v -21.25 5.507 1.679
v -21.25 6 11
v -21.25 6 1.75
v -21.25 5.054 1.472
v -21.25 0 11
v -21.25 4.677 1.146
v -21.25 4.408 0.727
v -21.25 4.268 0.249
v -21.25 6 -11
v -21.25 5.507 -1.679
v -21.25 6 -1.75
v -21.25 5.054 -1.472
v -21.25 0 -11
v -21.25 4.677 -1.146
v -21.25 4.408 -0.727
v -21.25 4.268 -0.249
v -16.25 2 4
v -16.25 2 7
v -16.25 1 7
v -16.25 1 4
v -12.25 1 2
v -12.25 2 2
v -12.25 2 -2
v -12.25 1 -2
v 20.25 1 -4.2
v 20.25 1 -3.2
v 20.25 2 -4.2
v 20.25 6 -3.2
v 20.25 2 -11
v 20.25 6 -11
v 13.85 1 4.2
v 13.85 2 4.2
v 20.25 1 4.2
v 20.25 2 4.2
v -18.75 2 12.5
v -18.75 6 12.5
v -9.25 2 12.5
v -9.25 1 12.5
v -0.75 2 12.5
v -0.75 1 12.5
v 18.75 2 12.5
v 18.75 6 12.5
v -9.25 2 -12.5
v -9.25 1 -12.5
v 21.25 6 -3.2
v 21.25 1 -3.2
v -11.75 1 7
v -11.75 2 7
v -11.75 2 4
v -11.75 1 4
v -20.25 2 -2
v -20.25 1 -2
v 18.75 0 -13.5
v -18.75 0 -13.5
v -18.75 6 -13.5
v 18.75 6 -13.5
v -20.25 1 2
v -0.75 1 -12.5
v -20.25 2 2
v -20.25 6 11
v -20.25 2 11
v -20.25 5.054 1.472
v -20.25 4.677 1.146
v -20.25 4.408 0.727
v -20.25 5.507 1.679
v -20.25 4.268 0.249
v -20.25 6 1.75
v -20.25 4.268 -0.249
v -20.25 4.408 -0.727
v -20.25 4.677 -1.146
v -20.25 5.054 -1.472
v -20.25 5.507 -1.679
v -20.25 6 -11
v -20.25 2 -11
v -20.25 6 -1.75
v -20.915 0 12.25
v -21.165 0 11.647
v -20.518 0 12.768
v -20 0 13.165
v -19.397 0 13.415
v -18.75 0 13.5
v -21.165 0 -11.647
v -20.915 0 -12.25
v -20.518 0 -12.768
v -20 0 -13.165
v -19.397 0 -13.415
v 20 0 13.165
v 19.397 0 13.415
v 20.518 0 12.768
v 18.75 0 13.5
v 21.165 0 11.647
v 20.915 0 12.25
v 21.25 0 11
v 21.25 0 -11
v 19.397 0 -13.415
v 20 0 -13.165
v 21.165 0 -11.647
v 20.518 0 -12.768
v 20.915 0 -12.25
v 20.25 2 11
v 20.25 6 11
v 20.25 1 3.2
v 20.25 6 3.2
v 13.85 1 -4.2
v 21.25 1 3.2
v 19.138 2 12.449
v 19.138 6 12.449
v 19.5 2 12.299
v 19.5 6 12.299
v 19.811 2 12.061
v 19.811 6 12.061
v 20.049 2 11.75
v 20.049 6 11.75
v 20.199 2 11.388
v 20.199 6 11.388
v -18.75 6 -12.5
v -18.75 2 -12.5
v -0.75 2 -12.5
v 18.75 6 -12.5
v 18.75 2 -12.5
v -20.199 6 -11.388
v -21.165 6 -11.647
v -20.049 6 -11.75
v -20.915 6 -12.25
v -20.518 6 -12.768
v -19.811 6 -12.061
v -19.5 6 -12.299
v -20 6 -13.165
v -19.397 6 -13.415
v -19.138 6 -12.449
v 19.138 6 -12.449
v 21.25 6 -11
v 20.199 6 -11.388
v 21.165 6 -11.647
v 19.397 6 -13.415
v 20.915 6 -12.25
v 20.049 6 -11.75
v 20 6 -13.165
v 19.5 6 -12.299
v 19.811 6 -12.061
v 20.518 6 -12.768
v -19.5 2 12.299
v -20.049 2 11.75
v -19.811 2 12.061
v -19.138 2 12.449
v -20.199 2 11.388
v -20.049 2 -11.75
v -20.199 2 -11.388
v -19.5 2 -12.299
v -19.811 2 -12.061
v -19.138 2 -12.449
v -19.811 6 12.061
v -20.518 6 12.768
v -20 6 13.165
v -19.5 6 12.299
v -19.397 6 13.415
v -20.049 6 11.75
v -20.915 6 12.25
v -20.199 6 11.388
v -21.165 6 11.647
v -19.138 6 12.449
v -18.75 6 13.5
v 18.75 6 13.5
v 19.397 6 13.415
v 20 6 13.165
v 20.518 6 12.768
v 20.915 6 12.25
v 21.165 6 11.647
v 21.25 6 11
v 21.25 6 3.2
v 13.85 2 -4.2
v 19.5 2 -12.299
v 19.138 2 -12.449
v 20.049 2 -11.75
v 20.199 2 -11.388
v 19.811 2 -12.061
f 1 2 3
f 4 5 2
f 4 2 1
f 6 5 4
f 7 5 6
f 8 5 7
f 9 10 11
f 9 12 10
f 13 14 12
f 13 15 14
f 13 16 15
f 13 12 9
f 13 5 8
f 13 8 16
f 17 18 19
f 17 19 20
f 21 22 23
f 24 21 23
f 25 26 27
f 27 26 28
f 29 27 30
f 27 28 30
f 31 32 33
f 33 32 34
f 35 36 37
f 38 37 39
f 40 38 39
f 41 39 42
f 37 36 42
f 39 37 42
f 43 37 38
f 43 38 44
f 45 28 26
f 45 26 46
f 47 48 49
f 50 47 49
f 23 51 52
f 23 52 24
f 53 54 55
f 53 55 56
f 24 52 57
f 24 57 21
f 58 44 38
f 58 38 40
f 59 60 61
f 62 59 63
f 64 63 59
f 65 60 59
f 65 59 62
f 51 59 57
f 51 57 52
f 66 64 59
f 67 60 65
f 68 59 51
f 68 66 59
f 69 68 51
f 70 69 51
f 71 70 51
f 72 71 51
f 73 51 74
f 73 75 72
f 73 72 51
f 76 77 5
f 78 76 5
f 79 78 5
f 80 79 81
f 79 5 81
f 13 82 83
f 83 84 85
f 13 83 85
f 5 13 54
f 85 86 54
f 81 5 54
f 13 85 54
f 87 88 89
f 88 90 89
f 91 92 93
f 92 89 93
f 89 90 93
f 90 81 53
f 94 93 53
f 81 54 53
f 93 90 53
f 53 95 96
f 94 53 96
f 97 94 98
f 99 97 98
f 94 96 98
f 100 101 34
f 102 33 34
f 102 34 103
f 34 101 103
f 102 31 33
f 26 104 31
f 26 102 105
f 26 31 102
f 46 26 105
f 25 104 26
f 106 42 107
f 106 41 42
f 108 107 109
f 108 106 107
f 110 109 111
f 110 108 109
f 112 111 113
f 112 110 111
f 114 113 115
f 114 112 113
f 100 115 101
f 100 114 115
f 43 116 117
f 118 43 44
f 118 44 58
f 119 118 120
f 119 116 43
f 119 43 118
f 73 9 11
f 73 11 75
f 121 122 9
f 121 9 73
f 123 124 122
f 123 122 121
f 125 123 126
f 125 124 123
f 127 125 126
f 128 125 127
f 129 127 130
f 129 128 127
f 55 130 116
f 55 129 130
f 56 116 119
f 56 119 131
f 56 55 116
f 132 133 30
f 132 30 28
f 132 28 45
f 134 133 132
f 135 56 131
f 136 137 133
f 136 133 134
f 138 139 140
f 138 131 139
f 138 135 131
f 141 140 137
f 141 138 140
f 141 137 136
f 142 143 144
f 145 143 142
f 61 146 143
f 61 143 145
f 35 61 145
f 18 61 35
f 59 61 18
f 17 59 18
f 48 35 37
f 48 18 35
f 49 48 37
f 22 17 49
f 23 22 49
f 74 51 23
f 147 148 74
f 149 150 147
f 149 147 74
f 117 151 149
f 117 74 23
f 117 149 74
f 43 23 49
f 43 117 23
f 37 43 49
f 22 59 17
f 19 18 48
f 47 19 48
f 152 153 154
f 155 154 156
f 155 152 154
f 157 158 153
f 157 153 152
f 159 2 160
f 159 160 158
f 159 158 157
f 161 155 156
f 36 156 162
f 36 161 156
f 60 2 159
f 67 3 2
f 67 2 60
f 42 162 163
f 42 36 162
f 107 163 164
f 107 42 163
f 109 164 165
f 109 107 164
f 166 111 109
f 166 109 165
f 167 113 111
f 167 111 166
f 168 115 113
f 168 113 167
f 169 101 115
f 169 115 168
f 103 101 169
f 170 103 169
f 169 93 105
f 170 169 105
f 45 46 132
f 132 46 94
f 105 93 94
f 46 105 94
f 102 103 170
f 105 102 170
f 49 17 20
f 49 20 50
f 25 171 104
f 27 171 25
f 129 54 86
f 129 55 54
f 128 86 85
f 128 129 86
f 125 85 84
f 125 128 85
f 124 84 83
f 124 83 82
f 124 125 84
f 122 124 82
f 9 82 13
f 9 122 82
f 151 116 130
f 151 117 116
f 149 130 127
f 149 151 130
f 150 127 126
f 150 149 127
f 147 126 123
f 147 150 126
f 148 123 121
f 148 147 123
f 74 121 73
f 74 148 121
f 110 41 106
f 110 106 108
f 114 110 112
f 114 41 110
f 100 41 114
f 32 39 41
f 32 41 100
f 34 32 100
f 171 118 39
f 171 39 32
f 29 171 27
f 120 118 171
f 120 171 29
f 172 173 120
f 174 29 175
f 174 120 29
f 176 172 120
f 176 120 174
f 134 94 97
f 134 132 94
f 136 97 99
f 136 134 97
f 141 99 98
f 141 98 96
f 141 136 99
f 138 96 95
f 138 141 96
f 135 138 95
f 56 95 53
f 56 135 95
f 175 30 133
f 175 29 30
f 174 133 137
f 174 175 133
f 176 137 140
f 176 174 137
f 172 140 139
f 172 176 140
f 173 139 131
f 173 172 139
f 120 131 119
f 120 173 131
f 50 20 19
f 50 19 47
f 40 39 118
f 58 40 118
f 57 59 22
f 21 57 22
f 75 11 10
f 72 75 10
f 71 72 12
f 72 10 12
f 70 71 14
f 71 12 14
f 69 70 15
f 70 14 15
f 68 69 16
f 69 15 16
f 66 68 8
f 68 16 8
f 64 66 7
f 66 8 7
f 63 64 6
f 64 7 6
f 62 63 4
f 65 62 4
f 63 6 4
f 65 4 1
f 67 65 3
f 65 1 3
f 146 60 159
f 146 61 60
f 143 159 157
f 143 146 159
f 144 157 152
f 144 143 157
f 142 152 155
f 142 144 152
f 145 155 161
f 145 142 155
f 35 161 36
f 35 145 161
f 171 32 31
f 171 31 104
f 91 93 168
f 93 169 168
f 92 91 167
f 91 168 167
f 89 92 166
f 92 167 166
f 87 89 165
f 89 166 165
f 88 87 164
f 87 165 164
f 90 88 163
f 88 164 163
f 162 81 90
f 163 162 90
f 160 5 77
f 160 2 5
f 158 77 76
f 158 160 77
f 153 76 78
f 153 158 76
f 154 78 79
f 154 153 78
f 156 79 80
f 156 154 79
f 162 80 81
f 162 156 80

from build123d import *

# Parameters (mm, degrees)
SKETCH1_W           = 42.5
SKETCH1_H           = 27
BOSS_EXTRUDE1_DEPTH = 6
SKETCH2_W           = 40.5
SKETCH2_H           = 25
CUT_EXTRUDE1_DEPTH  = 4
SKETCH3_W           = 6.4
SKETCH3_H           = 6.4
CUT_EXTRUDE2_DEPTH  = 5
CUT_EXTRUDE3_REACH  = 44.5
SKETCH4_R           = 1.75
SKETCH5_W           = 8.5
SKETCH5_H           = 25
CUT_EXTRUDE4_DEPTH  = 1
SKETCH6_W           = 8
SKETCH6_H           = 4
CUT_EXTRUDE5_DEPTH  = 1
SKETCH7_W           = 4.5
SKETCH7_H           = 3
CUT_EXTRUDE6_DEPTH  = 1
FILLET1_R           = 1.5
FILLET2_R           = 2.5
SKETCH8_W           = 6.4
SKETCH8_H           = 8.4
CUT_EXTRUDE7_DEPTH  = 1


with BuildPart() as part:
    # Sketch1 → Boss-Extrude1 (new body)
    with BuildSketch(Plane(origin=(0, 0, 0), x_dir=(1, 0, 0), z_dir=(0, 1, 0))):
        Rectangle(SKETCH1_W, SKETCH1_H)
    extrude(amount=BOSS_EXTRUDE1_DEPTH)

    # Sketch2 → Cut-Extrude1 (cut)
    with BuildSketch(Plane(origin=(0, 6, 0), x_dir=(1, 0, 0), z_dir=(0, 1, 0))):
        Rectangle(SKETCH2_W, SKETCH2_H)
    extrude(amount=-CUT_EXTRUDE1_DEPTH, mode=Mode.SUBTRACT)

    # Sketch3 → Cut-Extrude2 (cut)
    with BuildSketch(Plane(origin=(0, 6, 0), x_dir=(1, 0, 0), z_dir=(0, 1, 0))):
        with Locations((18.05, 0)):
            Rectangle(SKETCH3_W, SKETCH3_H)
    extrude(amount=-CUT_EXTRUDE2_DEPTH, mode=Mode.SUBTRACT)

    # Sketch4 → Cut-Extrude3 (cut, up to next)
    with BuildSketch(Plane.ZY.offset(21.25), mode=Mode.PRIVATE) as cut_extrude3_sk1:
        with Locations((0, 6)):
            Circle(SKETCH4_R)
    cut_extrude3_tool1 = extrude(cut_extrude3_sk1.sketch, amount=-CUT_EXTRUDE3_REACH, mode=Mode.PRIVATE) & part.part
    add(cut_extrude3_tool1.solids().sort_by_distance((-21.25, 6, 0))[0], mode=Mode.SUBTRACT)

    # Sketch5 → Cut-Extrude4 (cut)
    with BuildSketch(Plane(origin=(0, 2, 0), x_dir=(1, 0, 0), z_dir=(0, 1, 0))):
        with Locations((-5, 0)):
            Rectangle(SKETCH5_W, SKETCH5_H)
    extrude(amount=-CUT_EXTRUDE4_DEPTH, mode=Mode.SUBTRACT)

    # Sketch6 → Cut-Extrude5 (cut)
    with BuildSketch(Plane(origin=(0, 2, 0), x_dir=(1, 0, 0), z_dir=(0, 1, 0))):
        with Locations((-16.25, 0)):
            Rectangle(SKETCH6_W, SKETCH6_H)
    extrude(amount=-CUT_EXTRUDE5_DEPTH, mode=Mode.SUBTRACT)

    # Sketch7 → Cut-Extrude6 (cut)
    with BuildSketch(Plane(origin=(0, 2, 0), x_dir=(1, 0, 0), z_dir=(0, 1, 0))):
        with Locations((-14, -5.5)):
            Rectangle(SKETCH7_W, SKETCH7_H)
    extrude(amount=-CUT_EXTRUDE6_DEPTH, mode=Mode.SUBTRACT)

    # Fillet1
    fillet1_edges = [part.edges().sort_by_distance(p)[0] for p in [
        (20.25, 4, -12.5),
        (20.25, 4, 12.5),
        (-20.25, 4, 12.5),
        (-20.25, 4, -12.5),
    ]]
    fillet(fillet1_edges, radius=FILLET1_R)

    # Fillet2
    fillet2_edges = [part.edges().sort_by_distance(p)[0] for p in [
        (21.25, 3, 13.5),
        (-21.25, 3, 13.5),
        (-21.25, 3, -13.5),
        (21.25, 3, -13.5),
    ]]
    fillet(fillet2_edges, radius=FILLET2_R)

    # Sketch8 → Cut-Extrude7 (cut)
    with BuildSketch(Plane(origin=(0, 2, 0), x_dir=(1, 0, 0), z_dir=(0, 1, 0))):
        with Locations((17.05, 0)):
            Rectangle(SKETCH8_W, SKETCH8_H)
    extrude(amount=-CUT_EXTRUDE7_DEPTH, mode=Mode.SUBTRACT)


solid = part.part
